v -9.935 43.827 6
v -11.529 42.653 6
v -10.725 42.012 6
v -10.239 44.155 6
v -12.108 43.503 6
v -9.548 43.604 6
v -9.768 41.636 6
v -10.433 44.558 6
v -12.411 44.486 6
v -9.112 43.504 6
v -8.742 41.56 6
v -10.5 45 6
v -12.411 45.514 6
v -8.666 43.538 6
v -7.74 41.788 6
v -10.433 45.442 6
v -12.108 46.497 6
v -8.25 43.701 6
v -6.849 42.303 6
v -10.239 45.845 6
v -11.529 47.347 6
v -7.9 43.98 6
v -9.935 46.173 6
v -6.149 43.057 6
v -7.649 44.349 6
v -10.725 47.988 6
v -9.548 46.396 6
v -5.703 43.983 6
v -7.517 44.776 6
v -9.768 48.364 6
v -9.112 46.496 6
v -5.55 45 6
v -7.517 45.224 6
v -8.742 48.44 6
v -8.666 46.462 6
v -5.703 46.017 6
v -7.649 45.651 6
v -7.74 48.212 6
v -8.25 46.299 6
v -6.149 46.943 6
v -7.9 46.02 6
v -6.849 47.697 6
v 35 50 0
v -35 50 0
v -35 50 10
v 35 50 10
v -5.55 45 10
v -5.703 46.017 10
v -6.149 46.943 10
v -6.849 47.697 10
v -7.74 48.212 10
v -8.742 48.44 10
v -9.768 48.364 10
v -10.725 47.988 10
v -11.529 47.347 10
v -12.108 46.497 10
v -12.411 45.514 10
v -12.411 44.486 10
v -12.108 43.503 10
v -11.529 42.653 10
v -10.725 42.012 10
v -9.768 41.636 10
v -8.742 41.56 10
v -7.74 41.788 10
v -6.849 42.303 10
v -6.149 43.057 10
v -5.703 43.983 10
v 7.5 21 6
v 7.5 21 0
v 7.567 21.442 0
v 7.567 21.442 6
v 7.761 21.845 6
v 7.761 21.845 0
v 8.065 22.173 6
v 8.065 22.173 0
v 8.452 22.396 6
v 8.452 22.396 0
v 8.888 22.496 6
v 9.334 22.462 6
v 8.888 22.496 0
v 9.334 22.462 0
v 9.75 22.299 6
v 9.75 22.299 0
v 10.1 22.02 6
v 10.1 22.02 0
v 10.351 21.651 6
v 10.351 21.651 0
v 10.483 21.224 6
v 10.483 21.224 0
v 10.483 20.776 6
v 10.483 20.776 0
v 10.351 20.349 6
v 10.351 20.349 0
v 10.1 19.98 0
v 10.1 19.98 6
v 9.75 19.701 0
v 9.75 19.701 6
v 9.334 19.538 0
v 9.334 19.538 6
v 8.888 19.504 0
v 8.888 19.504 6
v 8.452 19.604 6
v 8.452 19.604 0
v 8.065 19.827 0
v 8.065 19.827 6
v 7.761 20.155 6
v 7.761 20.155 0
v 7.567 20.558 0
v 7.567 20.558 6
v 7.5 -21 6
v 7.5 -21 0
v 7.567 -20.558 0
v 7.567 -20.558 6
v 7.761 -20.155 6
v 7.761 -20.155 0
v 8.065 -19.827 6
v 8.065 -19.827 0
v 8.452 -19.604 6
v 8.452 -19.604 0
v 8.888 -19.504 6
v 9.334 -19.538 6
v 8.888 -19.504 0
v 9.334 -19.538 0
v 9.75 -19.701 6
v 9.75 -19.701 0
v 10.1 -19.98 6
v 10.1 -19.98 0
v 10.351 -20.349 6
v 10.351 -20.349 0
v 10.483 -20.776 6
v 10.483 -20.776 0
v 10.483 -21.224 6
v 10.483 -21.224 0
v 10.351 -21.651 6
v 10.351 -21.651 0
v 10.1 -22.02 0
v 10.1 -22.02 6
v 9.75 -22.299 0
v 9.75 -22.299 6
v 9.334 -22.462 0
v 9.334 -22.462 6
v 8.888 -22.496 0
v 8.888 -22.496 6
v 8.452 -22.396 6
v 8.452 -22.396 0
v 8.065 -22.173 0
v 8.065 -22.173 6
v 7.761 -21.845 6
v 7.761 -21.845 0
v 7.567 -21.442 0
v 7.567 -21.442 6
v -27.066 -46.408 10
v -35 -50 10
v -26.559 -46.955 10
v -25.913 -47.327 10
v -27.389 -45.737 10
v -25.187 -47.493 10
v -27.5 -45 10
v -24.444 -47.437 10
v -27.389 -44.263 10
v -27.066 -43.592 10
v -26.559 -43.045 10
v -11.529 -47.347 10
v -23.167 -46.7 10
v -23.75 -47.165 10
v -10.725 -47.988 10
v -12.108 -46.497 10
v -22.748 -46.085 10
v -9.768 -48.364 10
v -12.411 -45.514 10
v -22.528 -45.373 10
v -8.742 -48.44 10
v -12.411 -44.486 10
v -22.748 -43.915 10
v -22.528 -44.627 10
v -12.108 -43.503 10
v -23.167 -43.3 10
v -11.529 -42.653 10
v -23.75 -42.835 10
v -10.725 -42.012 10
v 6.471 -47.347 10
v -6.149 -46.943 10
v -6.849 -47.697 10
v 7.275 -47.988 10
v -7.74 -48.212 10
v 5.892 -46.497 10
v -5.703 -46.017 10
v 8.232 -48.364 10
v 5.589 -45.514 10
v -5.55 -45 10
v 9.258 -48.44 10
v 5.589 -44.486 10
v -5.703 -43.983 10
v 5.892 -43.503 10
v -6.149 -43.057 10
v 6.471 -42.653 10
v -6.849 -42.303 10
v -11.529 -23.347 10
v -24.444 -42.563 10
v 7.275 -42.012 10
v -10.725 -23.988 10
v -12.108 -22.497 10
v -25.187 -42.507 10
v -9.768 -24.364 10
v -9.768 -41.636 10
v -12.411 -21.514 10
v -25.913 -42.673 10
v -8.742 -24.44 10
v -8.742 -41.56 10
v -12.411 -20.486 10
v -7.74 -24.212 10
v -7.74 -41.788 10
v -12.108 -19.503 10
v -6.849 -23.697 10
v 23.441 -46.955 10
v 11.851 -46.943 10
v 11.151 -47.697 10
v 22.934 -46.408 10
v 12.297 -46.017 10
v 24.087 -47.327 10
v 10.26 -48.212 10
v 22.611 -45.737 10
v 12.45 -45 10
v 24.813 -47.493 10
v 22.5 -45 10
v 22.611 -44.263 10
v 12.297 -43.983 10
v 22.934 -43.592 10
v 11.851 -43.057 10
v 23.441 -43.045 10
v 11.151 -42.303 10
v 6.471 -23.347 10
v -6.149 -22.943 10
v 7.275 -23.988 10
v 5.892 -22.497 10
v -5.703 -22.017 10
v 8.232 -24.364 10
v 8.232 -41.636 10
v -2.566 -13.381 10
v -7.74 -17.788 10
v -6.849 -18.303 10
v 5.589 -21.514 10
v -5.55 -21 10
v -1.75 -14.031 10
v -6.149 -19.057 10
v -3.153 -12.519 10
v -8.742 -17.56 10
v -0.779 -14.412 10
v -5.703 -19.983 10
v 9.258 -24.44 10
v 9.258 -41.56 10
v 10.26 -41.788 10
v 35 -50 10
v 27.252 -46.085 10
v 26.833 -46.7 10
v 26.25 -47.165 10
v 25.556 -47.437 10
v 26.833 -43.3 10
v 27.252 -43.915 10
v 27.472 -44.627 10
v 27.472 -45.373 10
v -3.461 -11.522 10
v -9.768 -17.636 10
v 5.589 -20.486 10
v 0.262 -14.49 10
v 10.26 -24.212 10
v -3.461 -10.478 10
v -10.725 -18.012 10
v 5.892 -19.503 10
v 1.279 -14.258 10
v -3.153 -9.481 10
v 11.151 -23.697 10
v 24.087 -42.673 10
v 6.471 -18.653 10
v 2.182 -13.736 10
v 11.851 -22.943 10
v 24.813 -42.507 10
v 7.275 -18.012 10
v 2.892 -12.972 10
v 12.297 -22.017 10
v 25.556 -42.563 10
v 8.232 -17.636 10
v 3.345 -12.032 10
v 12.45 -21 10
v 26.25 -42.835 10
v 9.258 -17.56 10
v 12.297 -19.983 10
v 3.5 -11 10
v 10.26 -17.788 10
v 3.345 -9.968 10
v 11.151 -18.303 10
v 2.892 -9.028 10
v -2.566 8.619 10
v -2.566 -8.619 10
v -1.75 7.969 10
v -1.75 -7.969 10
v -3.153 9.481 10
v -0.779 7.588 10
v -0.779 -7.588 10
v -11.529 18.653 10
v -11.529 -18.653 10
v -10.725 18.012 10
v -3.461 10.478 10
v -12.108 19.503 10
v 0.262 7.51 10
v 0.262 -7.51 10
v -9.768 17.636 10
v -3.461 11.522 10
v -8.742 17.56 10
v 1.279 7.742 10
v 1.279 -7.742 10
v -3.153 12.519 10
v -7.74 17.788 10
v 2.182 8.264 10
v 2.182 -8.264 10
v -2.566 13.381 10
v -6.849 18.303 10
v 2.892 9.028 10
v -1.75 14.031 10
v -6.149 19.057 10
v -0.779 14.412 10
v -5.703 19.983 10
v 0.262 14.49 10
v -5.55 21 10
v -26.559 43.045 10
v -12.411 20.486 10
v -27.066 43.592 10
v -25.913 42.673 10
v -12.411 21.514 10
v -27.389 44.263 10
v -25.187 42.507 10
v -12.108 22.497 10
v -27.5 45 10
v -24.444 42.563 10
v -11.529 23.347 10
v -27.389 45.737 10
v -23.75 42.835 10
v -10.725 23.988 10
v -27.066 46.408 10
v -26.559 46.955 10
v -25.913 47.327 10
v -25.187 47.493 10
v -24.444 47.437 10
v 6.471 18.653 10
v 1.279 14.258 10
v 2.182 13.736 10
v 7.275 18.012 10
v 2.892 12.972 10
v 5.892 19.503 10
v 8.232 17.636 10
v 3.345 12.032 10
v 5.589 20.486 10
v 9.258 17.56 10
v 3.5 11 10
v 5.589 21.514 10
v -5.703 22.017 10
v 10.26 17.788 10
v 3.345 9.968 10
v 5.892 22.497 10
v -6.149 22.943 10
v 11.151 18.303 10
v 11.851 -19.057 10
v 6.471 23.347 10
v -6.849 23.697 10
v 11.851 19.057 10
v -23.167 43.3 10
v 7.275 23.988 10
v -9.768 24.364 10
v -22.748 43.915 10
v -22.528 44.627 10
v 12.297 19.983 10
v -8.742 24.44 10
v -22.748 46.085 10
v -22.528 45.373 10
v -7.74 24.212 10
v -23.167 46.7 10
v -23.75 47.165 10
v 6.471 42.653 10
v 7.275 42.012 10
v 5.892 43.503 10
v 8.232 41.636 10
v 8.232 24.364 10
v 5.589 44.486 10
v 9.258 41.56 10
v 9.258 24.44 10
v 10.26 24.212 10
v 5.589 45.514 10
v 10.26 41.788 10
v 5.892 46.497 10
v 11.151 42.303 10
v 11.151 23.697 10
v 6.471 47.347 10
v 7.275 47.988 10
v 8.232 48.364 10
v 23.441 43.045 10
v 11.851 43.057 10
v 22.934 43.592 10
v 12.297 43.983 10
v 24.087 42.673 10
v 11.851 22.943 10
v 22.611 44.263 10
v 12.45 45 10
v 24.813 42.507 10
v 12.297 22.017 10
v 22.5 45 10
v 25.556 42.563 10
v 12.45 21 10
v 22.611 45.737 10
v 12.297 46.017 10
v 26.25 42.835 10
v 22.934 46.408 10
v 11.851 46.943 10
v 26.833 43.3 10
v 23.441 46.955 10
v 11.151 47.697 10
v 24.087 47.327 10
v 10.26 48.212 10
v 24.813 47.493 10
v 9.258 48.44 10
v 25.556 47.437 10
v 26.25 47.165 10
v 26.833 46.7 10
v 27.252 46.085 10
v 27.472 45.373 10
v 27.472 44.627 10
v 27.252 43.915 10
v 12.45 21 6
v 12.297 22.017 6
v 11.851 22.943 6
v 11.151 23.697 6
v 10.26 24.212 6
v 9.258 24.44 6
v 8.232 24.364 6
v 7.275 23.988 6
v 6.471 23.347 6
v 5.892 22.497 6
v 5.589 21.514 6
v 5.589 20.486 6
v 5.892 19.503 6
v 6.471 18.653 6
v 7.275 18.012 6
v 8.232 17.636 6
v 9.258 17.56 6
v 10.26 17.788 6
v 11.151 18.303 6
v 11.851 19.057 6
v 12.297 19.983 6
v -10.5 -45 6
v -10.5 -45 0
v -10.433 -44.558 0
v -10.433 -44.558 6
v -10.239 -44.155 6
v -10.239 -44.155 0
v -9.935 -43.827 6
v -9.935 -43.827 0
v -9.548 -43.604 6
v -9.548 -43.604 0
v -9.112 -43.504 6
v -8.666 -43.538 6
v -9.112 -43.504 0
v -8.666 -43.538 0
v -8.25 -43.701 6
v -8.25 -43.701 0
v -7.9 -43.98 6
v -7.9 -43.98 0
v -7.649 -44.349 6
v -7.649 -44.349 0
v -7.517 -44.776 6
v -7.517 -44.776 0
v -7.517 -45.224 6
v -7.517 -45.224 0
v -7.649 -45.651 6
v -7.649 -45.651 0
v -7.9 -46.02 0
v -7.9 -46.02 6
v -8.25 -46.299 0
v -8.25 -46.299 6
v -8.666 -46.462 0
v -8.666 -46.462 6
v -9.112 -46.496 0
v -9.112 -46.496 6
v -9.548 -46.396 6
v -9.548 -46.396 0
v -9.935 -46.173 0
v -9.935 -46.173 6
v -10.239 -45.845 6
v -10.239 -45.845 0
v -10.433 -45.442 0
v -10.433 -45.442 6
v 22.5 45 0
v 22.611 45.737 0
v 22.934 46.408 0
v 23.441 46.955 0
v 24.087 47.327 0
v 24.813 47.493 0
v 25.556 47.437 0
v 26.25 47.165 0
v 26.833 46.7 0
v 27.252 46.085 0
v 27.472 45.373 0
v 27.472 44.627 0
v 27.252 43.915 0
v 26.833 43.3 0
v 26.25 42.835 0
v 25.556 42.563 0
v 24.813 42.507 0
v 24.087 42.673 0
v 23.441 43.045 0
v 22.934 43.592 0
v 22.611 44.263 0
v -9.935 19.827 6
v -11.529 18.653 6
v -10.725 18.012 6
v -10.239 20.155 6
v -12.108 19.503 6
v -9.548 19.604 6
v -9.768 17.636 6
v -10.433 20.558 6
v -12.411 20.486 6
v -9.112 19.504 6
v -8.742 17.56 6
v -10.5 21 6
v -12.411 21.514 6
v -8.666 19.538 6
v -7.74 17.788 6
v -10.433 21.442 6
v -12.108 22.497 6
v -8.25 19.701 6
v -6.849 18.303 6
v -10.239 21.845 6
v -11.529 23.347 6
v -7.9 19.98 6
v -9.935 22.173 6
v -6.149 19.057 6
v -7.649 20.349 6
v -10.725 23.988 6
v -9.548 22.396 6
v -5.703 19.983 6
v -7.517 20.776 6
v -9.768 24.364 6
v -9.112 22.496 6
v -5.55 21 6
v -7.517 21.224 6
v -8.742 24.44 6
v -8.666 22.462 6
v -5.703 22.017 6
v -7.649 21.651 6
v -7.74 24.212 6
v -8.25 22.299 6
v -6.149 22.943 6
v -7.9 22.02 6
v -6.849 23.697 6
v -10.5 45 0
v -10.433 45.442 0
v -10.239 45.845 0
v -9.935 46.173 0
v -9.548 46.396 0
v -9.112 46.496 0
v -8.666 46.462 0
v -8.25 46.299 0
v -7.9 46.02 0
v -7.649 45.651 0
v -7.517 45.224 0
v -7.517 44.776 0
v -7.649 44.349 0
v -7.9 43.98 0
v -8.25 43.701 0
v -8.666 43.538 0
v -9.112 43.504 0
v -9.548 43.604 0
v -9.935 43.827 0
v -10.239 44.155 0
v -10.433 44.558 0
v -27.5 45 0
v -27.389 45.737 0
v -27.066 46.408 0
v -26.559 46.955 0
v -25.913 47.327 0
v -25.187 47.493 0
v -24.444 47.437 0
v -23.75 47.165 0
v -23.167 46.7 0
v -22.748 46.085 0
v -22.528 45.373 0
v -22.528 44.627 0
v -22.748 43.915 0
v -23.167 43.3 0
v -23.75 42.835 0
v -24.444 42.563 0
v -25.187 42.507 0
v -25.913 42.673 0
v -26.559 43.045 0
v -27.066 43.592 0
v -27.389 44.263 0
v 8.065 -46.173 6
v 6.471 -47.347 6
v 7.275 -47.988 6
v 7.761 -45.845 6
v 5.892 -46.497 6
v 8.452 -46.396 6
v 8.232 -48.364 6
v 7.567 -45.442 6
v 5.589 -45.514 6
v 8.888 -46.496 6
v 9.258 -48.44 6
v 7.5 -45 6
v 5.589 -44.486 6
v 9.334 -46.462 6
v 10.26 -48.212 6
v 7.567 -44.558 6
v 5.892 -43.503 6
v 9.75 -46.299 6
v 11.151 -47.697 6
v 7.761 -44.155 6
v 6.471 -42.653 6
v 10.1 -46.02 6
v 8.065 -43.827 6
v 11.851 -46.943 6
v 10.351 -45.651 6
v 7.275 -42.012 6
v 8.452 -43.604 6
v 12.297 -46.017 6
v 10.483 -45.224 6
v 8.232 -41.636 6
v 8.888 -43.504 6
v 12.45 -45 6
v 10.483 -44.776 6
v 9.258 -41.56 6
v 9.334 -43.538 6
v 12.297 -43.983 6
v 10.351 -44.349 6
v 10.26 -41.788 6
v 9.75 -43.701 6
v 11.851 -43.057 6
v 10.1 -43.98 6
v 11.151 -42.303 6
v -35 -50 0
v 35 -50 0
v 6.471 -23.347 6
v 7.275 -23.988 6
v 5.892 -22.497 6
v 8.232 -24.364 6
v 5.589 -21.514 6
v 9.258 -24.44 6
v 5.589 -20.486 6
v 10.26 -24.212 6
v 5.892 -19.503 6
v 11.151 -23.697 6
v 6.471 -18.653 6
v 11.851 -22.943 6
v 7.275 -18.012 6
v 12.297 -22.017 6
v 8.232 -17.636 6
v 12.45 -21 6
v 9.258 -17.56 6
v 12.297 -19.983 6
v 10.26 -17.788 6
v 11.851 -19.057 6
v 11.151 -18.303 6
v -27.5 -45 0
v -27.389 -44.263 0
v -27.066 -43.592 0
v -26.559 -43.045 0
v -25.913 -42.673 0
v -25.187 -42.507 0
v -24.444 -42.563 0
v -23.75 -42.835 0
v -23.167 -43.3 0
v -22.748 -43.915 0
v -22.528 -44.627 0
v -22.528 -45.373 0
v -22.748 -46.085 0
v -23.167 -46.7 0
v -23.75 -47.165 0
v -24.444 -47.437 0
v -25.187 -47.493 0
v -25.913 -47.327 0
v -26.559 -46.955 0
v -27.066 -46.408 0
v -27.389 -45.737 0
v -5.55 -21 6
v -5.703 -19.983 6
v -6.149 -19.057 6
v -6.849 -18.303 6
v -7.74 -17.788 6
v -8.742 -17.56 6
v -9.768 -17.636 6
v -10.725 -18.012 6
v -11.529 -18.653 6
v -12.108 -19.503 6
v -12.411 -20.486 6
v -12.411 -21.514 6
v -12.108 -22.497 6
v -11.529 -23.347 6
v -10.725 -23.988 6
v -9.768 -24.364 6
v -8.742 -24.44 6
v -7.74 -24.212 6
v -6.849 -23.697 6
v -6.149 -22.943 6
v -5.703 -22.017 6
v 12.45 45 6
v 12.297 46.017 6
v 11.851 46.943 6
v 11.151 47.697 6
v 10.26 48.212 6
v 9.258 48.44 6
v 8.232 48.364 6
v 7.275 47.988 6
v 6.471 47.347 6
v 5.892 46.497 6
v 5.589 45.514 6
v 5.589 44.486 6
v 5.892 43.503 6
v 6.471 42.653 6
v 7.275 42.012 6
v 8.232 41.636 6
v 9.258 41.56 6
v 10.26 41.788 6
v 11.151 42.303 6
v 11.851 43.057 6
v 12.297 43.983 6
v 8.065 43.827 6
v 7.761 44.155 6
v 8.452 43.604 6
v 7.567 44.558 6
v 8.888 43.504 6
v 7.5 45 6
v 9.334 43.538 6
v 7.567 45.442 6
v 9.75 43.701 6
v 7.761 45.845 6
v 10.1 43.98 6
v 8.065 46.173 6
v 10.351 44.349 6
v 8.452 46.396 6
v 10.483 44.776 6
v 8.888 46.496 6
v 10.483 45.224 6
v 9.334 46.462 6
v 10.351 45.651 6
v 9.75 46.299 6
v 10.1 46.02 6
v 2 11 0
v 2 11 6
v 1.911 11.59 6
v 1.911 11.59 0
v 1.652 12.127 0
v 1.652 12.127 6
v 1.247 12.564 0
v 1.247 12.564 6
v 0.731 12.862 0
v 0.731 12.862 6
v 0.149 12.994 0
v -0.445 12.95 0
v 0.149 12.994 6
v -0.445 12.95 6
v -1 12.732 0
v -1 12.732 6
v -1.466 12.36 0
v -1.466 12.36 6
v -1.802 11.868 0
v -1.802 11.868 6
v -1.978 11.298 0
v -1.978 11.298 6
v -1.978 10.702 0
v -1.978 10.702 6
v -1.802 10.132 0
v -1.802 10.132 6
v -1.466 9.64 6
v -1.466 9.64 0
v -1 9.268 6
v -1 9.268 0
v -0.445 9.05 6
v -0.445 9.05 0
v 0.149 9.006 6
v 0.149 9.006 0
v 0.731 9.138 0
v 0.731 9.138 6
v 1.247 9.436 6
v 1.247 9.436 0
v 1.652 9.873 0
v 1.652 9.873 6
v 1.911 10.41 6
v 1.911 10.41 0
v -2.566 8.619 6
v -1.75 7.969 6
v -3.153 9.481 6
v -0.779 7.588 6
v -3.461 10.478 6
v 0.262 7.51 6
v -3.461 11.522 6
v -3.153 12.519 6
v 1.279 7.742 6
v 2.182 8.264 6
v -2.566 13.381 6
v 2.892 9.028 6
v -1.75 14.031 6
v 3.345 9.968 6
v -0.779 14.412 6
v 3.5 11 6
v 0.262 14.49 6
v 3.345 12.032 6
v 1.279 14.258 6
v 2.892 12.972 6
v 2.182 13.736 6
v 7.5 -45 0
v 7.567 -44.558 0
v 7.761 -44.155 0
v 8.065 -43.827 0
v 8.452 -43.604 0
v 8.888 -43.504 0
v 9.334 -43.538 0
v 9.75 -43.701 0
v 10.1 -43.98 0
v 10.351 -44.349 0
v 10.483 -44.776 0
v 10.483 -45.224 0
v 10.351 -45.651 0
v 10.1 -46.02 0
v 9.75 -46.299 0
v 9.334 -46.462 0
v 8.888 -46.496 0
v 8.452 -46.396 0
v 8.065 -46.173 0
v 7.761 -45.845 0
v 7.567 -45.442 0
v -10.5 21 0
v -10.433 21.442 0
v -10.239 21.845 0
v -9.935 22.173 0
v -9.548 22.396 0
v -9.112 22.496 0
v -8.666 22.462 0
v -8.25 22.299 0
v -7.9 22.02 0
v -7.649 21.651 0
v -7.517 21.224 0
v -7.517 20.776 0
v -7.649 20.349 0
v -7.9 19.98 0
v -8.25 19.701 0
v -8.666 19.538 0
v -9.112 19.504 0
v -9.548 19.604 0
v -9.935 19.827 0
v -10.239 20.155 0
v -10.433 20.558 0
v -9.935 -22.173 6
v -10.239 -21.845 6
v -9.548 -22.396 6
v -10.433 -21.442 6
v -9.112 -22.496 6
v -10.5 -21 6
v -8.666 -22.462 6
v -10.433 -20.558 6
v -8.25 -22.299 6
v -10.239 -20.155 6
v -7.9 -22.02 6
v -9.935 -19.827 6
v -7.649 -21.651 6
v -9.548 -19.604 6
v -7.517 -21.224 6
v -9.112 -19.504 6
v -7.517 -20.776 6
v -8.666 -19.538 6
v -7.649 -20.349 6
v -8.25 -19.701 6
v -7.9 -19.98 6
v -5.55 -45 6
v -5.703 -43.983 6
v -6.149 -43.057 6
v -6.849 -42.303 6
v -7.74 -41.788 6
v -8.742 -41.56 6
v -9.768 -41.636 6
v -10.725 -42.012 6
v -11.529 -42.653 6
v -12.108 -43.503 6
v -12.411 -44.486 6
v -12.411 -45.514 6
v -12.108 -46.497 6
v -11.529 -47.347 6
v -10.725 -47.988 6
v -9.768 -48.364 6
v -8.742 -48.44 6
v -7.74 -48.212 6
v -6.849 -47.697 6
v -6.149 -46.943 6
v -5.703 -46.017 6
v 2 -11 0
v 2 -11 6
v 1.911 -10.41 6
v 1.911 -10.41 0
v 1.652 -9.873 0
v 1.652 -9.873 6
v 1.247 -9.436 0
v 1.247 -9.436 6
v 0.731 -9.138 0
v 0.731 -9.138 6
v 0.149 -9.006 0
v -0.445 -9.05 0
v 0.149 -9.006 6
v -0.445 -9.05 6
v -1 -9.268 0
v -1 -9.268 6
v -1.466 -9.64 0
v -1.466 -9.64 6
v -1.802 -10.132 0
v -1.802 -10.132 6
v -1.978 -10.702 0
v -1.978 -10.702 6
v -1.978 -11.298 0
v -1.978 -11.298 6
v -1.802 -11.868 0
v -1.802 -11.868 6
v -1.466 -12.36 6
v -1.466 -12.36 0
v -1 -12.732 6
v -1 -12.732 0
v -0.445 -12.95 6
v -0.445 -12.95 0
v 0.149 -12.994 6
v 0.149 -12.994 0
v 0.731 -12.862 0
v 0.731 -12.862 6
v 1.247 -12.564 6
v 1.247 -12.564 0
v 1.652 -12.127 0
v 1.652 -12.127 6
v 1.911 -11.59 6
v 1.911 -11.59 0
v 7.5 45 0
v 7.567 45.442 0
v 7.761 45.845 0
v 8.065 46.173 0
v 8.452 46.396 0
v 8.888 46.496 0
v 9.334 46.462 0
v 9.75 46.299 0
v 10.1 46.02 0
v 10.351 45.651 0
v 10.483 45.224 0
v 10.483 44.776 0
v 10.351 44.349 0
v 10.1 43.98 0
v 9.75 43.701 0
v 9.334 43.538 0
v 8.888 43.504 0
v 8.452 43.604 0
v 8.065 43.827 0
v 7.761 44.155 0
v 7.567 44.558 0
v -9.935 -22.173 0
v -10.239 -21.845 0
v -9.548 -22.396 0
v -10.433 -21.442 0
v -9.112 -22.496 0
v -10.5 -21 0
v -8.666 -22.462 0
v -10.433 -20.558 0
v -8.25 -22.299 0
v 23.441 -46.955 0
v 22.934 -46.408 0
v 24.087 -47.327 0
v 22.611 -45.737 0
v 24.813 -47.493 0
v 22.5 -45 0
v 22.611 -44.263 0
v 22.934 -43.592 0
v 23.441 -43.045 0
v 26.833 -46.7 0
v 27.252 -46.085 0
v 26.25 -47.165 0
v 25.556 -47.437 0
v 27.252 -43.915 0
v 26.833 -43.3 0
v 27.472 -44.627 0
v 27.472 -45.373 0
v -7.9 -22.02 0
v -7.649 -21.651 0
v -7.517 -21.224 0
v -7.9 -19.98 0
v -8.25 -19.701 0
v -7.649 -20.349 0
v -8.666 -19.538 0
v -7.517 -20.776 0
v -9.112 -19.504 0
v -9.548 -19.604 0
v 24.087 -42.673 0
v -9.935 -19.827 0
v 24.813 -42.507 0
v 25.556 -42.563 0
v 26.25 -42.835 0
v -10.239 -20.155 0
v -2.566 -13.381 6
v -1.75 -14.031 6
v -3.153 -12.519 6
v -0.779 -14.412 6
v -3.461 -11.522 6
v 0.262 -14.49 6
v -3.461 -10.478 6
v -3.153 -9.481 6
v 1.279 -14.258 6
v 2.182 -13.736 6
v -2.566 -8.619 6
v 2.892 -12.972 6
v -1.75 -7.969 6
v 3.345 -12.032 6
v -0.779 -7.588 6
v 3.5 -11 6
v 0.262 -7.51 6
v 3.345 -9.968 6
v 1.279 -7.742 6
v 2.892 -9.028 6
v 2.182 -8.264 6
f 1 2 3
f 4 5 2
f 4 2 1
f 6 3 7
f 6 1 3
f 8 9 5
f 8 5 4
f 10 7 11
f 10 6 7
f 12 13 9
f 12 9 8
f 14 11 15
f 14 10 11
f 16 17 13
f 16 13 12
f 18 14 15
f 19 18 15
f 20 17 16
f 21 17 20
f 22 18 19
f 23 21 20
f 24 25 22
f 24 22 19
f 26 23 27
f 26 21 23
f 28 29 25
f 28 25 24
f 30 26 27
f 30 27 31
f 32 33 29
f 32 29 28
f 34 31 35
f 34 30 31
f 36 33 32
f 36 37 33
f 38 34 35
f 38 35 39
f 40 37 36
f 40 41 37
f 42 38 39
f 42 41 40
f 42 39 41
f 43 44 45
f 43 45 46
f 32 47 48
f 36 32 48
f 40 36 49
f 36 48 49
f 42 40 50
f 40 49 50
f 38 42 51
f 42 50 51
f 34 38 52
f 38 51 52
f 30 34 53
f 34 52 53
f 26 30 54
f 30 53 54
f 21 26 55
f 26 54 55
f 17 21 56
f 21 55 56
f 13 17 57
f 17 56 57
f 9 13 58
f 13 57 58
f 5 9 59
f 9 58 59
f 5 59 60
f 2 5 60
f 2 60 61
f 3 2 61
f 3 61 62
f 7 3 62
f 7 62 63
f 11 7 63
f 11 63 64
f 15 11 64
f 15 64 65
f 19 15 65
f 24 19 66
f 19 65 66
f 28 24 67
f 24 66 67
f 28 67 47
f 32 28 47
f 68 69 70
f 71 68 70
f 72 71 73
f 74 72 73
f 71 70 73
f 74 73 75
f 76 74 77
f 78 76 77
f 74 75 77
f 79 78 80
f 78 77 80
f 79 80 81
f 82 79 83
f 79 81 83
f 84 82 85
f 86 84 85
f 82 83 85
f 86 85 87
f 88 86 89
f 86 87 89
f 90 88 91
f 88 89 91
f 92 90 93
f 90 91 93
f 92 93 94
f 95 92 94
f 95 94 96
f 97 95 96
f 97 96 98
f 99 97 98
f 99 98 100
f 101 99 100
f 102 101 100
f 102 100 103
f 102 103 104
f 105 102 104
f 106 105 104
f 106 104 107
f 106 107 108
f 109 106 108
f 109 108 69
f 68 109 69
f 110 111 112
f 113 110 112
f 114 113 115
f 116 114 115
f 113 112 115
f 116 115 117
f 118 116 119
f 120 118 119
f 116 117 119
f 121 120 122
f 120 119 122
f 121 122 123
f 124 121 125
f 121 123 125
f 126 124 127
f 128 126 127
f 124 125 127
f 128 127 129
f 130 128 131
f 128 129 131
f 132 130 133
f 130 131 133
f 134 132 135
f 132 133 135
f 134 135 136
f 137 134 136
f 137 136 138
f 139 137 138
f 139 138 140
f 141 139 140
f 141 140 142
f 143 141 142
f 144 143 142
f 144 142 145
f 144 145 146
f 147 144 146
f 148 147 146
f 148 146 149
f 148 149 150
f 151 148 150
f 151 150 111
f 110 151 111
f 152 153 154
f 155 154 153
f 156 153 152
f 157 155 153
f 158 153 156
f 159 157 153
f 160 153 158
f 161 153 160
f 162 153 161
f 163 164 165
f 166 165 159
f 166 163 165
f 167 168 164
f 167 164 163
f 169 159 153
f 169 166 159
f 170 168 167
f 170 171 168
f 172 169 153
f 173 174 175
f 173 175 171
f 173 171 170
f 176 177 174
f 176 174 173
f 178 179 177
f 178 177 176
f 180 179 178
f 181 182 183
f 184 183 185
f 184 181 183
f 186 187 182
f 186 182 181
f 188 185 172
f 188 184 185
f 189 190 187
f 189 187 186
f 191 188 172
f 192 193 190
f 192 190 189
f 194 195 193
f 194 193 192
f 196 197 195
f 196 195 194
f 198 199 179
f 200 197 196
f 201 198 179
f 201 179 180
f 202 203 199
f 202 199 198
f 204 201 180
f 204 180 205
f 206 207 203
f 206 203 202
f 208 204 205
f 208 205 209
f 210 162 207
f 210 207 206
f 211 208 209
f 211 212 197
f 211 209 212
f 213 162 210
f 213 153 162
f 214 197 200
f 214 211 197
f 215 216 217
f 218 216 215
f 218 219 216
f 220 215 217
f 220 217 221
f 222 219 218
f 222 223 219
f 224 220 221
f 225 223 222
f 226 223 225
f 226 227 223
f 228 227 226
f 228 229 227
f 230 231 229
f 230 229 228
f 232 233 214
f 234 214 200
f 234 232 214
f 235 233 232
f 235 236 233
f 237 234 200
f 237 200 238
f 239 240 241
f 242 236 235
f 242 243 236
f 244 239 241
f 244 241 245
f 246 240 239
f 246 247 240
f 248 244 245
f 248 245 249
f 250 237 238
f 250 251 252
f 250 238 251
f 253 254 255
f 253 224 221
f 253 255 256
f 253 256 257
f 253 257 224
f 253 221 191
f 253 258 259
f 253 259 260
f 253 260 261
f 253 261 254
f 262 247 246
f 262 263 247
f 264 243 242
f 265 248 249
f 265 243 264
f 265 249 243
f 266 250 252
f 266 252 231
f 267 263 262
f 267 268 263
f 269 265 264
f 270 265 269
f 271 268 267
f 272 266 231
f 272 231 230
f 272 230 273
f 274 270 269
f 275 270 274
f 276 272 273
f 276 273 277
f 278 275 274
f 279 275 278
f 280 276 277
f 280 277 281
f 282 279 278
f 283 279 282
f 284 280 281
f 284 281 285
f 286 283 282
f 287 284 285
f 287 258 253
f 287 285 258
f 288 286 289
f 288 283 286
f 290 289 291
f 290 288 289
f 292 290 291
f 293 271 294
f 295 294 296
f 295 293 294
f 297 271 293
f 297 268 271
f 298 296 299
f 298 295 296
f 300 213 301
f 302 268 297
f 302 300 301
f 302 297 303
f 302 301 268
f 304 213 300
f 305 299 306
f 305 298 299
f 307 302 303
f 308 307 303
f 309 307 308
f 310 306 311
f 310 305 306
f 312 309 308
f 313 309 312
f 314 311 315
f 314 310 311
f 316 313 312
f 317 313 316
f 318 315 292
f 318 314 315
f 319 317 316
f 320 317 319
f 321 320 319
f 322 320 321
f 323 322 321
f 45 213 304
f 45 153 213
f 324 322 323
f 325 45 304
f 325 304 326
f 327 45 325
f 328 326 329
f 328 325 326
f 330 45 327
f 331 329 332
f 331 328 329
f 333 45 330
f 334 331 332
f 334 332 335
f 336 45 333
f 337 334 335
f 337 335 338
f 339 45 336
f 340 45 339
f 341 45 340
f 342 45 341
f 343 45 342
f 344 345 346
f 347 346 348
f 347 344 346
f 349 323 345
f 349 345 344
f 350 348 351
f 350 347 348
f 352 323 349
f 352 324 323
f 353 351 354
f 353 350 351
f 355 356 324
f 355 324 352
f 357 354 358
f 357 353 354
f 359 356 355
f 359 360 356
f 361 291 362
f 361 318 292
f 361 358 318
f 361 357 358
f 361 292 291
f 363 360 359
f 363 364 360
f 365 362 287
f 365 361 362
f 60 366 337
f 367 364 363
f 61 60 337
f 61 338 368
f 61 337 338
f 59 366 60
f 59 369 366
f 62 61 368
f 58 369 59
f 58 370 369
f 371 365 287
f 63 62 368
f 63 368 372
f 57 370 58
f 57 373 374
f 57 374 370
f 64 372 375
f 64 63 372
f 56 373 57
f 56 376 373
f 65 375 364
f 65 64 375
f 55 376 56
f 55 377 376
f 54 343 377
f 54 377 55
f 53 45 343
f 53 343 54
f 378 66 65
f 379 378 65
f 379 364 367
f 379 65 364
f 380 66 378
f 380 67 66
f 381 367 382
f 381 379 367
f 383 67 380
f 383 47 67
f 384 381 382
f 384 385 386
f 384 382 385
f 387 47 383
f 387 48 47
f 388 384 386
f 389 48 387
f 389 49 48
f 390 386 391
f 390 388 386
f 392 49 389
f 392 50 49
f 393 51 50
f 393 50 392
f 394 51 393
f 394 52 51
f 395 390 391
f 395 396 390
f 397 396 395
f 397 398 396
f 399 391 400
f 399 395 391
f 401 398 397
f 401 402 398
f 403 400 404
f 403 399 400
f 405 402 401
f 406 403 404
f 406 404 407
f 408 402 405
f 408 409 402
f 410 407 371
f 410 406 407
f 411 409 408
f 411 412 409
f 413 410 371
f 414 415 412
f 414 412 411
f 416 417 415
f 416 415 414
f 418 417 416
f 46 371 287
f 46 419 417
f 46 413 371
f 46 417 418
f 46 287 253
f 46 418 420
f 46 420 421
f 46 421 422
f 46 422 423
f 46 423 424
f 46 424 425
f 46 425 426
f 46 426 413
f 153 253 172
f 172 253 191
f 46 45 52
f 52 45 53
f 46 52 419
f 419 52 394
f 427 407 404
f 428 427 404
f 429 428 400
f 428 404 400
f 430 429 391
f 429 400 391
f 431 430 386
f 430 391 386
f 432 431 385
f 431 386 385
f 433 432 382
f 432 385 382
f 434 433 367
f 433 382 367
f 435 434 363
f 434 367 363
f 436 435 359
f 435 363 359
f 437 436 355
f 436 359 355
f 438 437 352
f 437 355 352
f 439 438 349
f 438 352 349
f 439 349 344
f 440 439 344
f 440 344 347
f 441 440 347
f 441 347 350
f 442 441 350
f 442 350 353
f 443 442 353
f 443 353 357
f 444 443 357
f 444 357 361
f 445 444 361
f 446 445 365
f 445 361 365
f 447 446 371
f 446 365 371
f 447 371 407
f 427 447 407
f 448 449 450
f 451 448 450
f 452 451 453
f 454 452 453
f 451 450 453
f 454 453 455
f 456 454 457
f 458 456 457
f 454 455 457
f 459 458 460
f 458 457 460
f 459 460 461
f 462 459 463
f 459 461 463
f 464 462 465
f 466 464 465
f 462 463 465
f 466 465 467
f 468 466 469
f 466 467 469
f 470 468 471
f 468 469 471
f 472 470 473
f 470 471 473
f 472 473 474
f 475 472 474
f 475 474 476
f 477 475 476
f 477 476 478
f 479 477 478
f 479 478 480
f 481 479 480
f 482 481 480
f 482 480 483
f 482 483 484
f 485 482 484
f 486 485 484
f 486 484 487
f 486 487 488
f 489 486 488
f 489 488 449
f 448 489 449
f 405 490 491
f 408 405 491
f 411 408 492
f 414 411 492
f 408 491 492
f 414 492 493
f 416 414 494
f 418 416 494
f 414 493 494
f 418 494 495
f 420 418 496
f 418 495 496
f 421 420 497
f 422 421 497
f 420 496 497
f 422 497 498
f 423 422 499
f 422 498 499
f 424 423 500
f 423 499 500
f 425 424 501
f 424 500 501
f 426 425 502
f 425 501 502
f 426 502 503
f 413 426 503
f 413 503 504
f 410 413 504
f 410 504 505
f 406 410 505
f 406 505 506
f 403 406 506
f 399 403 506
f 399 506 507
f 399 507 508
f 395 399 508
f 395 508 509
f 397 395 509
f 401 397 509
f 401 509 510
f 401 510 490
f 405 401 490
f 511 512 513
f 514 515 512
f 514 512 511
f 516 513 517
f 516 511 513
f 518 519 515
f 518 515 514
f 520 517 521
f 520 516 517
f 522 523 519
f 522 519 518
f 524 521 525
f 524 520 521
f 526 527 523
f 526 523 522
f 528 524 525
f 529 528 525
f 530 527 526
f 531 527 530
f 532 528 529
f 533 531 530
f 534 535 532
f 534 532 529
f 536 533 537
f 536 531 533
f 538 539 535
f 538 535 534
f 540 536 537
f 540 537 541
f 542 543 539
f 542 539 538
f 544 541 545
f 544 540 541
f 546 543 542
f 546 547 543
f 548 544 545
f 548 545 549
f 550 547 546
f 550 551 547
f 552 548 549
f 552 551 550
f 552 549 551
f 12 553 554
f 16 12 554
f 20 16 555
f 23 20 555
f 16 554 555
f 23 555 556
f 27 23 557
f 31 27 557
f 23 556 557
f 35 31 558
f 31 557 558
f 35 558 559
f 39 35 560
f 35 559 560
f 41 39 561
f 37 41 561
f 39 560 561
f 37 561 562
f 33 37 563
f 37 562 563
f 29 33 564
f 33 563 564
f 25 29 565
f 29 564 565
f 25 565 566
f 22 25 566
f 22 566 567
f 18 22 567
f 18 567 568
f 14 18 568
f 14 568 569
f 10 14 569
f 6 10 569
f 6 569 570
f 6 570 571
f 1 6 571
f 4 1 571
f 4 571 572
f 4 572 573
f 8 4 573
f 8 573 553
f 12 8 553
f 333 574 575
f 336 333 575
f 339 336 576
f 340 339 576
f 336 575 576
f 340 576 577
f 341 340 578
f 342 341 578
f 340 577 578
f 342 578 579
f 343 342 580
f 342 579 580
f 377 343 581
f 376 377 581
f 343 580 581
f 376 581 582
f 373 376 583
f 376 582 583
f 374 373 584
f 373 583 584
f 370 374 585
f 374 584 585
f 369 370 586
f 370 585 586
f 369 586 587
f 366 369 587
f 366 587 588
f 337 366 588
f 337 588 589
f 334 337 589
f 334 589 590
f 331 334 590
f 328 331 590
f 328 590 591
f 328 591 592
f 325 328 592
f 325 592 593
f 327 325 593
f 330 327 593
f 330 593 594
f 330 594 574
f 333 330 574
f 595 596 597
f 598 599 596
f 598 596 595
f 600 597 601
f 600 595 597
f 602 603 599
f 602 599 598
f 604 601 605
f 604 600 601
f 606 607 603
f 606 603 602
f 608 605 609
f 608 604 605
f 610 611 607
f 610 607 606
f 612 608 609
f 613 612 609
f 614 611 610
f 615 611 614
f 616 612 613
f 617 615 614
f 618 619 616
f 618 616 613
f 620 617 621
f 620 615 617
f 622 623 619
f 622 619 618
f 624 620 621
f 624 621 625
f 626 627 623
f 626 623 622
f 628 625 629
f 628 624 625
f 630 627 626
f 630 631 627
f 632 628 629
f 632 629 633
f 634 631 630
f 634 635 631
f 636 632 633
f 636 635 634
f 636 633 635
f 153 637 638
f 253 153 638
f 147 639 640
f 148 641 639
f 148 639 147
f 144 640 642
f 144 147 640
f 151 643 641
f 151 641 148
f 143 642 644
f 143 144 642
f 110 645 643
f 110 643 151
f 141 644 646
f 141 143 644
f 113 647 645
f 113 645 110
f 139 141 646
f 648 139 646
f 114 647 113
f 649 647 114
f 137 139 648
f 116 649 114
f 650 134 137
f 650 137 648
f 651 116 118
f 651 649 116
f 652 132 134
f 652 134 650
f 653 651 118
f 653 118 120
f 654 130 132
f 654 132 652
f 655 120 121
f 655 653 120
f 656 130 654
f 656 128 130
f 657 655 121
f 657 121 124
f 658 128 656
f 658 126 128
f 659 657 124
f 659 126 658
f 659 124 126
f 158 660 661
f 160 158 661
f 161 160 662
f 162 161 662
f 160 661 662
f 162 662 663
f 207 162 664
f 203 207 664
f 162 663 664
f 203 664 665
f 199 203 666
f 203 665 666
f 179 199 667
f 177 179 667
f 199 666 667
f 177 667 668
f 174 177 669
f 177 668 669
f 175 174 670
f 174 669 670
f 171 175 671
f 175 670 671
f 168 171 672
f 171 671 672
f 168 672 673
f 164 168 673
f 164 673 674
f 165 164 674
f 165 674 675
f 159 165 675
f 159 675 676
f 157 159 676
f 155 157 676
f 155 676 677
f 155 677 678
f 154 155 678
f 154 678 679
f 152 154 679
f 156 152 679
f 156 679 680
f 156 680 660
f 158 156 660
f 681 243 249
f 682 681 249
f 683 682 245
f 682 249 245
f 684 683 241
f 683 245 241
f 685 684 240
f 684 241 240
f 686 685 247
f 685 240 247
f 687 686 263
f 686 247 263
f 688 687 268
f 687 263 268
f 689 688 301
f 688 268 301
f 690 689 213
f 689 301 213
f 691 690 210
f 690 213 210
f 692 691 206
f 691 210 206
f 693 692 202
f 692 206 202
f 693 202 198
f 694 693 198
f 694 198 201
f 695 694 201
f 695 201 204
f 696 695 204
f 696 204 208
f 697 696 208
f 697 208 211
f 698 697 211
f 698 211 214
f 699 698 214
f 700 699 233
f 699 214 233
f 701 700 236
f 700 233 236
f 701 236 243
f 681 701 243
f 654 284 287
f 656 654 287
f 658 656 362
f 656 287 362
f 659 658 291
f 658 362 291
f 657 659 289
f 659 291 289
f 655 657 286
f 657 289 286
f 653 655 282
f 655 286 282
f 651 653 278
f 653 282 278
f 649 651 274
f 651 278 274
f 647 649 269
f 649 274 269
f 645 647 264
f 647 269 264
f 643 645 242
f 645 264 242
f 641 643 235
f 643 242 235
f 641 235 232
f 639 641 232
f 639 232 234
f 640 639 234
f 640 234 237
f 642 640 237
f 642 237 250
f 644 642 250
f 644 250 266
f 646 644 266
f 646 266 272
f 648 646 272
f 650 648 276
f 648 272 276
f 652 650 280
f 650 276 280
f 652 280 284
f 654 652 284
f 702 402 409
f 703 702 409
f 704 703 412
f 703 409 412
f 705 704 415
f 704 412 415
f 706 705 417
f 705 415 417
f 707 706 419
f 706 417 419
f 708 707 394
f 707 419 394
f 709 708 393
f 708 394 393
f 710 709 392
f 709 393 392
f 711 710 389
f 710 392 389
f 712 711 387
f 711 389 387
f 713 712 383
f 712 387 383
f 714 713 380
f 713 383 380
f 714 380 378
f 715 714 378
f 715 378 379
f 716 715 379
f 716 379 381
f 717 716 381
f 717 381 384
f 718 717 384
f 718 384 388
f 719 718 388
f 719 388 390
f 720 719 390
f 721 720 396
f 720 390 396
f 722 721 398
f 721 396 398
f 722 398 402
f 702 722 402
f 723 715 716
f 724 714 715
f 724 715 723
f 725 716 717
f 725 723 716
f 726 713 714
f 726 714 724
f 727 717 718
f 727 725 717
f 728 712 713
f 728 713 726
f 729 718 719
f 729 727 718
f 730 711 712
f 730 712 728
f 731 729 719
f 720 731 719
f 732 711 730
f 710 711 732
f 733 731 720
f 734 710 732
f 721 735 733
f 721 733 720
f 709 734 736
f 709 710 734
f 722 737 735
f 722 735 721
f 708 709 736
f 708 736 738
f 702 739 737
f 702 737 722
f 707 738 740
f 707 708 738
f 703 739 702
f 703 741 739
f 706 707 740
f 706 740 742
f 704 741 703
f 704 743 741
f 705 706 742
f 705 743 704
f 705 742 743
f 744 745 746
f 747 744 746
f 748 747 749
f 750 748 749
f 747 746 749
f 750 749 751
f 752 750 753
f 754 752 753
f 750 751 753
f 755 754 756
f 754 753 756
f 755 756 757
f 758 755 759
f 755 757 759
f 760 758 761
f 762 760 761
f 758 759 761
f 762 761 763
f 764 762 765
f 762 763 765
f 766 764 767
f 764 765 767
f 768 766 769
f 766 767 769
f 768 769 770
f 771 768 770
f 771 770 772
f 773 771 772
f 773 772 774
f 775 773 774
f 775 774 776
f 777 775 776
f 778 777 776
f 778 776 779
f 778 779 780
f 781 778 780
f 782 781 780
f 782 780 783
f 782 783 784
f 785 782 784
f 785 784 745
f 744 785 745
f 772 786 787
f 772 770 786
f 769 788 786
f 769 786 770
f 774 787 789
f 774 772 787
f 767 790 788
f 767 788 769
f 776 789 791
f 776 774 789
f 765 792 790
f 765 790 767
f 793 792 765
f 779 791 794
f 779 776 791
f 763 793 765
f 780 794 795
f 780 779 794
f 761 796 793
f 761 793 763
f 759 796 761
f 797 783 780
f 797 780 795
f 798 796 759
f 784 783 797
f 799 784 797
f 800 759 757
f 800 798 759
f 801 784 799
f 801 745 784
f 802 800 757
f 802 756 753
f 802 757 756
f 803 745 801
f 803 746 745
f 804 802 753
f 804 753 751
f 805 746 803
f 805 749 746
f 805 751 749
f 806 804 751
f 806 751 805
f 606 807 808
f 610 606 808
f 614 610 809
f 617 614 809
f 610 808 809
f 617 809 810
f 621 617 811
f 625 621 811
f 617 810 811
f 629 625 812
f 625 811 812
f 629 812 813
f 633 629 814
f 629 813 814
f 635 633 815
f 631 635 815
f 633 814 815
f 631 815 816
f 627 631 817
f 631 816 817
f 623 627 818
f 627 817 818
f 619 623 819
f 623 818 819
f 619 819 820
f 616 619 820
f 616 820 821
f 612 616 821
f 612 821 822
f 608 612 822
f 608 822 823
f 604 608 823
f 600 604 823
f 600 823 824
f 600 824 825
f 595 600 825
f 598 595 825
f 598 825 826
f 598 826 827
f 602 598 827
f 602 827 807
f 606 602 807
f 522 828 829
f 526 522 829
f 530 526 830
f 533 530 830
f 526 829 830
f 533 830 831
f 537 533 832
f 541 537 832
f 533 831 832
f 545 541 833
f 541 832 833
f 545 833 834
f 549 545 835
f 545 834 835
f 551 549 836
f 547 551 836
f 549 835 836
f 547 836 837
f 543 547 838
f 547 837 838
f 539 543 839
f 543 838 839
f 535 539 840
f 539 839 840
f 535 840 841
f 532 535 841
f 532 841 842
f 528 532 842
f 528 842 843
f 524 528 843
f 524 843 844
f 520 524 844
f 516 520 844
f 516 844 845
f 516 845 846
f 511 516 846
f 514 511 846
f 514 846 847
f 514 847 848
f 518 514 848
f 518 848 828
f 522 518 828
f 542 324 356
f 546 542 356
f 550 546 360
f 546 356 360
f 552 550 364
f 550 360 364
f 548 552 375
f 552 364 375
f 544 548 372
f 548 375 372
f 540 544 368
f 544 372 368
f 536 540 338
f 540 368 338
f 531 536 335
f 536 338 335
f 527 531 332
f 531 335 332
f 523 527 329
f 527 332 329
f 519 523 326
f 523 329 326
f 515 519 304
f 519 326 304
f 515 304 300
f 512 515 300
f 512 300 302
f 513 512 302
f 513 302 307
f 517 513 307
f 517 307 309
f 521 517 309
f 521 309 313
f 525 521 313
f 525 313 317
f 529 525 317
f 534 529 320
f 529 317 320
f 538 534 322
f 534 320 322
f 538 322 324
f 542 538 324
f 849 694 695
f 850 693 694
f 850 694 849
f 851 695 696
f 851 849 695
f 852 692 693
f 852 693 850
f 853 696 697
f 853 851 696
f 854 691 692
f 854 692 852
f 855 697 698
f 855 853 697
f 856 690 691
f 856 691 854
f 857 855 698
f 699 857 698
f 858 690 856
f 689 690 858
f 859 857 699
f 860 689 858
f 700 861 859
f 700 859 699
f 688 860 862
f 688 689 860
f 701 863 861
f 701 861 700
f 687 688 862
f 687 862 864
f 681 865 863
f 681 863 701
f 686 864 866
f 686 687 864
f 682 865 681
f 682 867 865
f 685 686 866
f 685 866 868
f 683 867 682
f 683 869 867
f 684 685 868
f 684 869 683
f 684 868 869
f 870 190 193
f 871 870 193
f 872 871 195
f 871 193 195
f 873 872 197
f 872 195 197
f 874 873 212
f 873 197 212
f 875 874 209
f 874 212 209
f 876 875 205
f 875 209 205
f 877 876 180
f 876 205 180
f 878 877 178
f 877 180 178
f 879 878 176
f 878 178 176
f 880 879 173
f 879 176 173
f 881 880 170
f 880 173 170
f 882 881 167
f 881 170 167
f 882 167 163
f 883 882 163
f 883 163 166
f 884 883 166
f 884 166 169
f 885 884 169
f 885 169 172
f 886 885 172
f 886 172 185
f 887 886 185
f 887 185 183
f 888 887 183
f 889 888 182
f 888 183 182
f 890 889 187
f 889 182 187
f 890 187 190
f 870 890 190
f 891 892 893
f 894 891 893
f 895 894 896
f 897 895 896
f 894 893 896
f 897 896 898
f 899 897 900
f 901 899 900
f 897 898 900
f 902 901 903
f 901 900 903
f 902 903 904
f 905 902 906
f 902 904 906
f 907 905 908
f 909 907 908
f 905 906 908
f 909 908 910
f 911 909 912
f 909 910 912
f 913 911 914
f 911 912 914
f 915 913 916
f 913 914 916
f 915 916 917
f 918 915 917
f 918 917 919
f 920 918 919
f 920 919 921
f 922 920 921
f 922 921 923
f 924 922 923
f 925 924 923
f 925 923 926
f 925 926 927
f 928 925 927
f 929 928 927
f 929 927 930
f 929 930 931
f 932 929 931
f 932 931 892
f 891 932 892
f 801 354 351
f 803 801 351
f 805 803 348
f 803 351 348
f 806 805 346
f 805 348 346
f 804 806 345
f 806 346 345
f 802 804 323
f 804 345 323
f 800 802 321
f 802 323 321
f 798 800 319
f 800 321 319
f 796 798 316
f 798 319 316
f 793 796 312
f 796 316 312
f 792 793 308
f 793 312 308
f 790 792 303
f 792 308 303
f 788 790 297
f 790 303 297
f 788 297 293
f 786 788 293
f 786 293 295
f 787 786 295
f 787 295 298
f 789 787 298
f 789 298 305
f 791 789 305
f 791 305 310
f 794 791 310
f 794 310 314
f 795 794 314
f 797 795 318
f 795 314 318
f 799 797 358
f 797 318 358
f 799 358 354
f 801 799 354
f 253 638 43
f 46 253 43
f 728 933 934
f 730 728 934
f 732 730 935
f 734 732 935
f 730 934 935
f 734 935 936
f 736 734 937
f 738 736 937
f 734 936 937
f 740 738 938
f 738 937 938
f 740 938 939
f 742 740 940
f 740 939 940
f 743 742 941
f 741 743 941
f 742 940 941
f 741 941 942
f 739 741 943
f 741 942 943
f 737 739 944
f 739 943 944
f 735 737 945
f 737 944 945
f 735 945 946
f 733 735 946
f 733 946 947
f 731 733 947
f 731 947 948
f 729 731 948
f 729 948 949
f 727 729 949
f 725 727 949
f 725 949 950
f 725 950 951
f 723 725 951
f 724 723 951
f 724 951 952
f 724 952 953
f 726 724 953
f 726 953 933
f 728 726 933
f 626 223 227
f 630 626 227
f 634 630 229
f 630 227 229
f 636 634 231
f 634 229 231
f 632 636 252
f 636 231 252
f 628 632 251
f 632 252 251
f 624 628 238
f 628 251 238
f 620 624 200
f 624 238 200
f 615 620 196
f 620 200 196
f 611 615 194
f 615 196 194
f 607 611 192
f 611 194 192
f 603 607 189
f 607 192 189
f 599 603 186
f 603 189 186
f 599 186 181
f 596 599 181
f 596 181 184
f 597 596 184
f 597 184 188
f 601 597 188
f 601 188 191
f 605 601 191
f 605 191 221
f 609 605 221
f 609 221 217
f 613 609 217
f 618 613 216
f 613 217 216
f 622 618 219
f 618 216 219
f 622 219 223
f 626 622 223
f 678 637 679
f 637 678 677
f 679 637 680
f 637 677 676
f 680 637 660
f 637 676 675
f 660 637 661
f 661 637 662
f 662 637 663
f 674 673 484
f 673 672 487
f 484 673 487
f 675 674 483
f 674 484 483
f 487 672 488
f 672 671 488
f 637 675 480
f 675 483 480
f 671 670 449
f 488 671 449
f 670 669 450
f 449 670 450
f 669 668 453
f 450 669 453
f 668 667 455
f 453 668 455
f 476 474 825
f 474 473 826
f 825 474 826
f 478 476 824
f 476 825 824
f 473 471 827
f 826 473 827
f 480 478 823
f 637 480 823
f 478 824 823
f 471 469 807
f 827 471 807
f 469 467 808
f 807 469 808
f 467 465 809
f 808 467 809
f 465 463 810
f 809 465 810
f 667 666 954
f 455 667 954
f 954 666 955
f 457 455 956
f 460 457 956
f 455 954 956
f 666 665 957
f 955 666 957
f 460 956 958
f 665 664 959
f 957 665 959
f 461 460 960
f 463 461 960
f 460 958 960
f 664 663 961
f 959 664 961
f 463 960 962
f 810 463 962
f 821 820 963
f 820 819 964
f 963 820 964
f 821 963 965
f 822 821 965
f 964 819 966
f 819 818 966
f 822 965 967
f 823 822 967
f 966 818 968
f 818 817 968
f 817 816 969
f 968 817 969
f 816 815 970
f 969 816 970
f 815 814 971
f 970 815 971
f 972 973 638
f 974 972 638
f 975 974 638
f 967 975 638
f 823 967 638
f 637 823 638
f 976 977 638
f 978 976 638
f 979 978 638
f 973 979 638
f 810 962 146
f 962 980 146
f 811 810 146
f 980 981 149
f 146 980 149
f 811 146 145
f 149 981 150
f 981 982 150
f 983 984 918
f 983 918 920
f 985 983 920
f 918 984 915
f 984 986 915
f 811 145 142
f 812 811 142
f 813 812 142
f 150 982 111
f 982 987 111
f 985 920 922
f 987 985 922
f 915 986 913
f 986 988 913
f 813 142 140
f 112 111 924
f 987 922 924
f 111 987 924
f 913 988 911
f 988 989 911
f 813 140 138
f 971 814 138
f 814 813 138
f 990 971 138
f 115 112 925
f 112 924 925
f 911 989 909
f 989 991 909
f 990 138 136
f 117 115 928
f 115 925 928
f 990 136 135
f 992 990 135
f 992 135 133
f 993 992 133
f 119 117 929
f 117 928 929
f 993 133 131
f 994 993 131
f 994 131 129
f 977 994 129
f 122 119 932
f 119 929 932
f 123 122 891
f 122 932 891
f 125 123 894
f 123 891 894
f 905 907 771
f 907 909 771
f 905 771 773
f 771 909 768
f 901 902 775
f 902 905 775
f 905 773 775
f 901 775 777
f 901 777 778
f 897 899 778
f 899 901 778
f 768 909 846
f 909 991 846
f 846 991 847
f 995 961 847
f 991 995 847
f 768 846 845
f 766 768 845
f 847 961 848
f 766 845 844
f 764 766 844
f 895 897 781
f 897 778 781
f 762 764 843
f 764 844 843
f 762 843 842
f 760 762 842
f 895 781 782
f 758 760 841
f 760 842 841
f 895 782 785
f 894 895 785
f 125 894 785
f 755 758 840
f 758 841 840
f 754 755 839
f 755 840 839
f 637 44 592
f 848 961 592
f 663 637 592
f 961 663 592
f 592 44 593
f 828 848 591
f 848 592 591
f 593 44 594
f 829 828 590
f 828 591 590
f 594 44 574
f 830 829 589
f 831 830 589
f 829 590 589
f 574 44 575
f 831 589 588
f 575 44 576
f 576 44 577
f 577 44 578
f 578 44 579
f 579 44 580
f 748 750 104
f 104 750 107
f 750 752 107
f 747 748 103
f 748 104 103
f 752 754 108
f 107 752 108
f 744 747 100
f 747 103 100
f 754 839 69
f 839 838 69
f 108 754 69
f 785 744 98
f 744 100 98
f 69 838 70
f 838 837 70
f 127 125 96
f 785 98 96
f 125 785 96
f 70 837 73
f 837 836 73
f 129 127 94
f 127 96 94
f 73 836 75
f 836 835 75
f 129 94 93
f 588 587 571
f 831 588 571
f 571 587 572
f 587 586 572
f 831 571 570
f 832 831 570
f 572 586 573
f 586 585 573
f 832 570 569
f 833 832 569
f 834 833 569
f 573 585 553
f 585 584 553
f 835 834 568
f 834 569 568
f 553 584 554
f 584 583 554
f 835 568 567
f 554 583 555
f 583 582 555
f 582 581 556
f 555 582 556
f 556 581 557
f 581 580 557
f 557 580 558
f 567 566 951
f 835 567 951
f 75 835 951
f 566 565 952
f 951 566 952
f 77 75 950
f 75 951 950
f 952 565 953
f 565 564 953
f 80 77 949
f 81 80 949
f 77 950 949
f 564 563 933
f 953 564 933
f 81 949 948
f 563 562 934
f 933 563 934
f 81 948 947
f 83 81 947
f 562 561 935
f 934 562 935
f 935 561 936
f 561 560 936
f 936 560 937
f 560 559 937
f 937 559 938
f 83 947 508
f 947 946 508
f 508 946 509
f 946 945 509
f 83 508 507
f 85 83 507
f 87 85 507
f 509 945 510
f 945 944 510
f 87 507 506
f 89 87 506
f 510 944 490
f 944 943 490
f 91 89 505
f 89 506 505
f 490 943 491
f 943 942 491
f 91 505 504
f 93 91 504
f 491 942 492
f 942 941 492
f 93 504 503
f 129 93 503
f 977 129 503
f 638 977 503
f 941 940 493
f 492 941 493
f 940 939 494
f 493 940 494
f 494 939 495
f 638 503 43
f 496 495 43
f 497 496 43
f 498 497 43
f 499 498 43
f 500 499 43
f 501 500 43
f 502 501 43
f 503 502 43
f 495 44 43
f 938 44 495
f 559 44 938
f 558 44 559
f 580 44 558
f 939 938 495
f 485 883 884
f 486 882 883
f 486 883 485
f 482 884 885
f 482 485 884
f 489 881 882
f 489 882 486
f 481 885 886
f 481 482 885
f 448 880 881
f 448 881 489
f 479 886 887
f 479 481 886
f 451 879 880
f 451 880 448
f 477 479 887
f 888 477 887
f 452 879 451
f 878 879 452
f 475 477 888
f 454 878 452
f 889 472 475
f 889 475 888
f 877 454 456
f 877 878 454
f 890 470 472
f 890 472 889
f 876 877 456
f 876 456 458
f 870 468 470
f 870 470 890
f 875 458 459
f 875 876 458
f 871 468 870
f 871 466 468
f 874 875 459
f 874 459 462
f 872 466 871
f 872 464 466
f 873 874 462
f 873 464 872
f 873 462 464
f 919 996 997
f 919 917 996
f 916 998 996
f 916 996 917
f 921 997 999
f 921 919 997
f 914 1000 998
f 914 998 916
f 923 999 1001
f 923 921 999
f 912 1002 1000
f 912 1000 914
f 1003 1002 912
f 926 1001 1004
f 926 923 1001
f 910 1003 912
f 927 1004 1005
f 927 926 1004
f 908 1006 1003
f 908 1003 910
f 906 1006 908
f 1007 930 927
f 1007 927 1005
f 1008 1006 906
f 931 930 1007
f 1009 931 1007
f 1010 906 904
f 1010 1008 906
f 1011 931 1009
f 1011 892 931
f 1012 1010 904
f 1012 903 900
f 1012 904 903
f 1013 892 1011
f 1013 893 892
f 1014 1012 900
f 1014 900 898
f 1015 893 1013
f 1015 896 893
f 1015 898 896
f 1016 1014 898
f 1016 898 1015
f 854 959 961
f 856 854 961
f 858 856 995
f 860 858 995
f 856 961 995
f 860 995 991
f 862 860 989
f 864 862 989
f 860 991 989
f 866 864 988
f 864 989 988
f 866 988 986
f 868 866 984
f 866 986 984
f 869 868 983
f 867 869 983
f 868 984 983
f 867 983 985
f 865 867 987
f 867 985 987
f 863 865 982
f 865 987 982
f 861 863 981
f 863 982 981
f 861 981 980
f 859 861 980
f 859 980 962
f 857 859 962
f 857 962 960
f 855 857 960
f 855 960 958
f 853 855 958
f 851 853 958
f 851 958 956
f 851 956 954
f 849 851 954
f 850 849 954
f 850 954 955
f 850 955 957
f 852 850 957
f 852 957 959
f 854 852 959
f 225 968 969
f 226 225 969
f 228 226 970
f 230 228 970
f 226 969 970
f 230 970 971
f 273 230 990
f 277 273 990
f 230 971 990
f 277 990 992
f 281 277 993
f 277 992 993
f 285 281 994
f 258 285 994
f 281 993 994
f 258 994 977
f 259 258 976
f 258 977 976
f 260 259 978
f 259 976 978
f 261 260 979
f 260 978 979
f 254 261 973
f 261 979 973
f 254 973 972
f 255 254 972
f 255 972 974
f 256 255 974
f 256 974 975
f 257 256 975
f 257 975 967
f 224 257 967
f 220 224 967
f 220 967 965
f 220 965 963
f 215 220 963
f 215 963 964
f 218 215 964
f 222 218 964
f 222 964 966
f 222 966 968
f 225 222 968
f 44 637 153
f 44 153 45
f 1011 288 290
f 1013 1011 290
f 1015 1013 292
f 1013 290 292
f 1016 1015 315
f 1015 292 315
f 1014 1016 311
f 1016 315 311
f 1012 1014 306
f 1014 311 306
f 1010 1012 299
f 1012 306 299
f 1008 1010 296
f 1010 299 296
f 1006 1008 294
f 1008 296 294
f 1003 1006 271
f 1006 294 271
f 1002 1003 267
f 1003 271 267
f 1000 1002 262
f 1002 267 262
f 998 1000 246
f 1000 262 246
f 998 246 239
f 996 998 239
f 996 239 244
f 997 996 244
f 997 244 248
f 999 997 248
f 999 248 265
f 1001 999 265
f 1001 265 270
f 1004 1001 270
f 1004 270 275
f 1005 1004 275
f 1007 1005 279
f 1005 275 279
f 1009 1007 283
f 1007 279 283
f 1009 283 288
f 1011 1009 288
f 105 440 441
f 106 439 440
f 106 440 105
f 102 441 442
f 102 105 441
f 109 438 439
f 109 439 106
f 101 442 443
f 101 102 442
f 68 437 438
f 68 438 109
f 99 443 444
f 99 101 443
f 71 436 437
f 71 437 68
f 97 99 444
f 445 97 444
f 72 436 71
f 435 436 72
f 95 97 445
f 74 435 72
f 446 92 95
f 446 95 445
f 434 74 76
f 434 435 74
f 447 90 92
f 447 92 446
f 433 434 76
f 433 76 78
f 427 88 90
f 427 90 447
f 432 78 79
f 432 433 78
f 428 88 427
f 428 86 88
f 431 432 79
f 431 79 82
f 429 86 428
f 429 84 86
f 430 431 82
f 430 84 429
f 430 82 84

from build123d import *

# Parameters (mm, degrees)
SKETCH1_W           = 70
SKETCH1_H           = 100
BOSS_EXTRUDE1_DEPTH = 10
SKETCH2_R           = 2.5
CUT_EXTRUDE1_DEPTH  = 11
SKETCH3_R           = 1.5
CUT_EXTRUDE2_DEPTH  = 11
SKETCH4_R           = 3.45
CUT_EXTRUDE3_DEPTH  = 4
SKETCH5_R           = 2
CUT_EXTRUDE4_DEPTH  = 11
SKETCH6_R           = 3.5
CUT_EXTRUDE5_DEPTH  = 4


with BuildPart() as part:
    # Sketch1 → Boss-Extrude1 (new body)
    with BuildSketch(Plane.XY):
        Rectangle(SKETCH1_W, SKETCH1_H)
    extrude(amount=BOSS_EXTRUDE1_DEPTH)

    # Sketch2 → Cut-Extrude1 (cut, through all)
    with BuildSketch(Plane(origin=(0, 0, 0), x_dir=(-1, 0, 0), z_dir=(0, 0, -1))):
        with Locations((-25, 45)):
            Circle(SKETCH2_R)
        with Locations((25, 45)):
            Circle(SKETCH2_R)
        with Locations((-25, -45)):
            Circle(SKETCH2_R)
        with Locations((25, -45)):
            Circle(SKETCH2_R)
    extrude(amount=-CUT_EXTRUDE1_DEPTH, mode=Mode.SUBTRACT)

    # Sketch3 → Cut-Extrude2 (cut, through all)
    with BuildSketch(Plane(origin=(0, 0, 0), x_dir=(-1, 0, 0), z_dir=(0, 0, -1))):
        with Locations((9, 21)):
            Circle(SKETCH3_R)
        with Locations((9, 45)):
            Circle(SKETCH3_R)
        with Locations((-9, 21)):
            Circle(SKETCH3_R)
        with Locations((-9, 45)):
            Circle(SKETCH3_R)
        with Locations((9, -45)):
            Circle(SKETCH3_R)
        with Locations((9, -21)):
            Circle(SKETCH3_R)
        with Locations((-9, -45)):
            Circle(SKETCH3_R)
        with Locations((-9, -21)):
            Circle(SKETCH3_R)
    extrude(amount=-CUT_EXTRUDE2_DEPTH, mode=Mode.SUBTRACT)

    # Sketch4 → Cut-Extrude3 (cut)
    with BuildSketch(Plane.XY.offset(10)):
        with Locations((-9, 45)):
            Circle(SKETCH4_R)
        with Locations((-9, 21)):
            Circle(SKETCH4_R)
        with Locations((9, 21)):
            Circle(SKETCH4_R)
        with Locations((9, 45)):
            Circle(SKETCH4_R)
        with Locations((9, -21)):
            Circle(SKETCH4_R)
        with Locations((-9, -21)):
            Circle(SKETCH4_R)
        with Locations((-9, -45)):
            Circle(SKETCH4_R)
        with Locations((9, -45)):
            Circle(SKETCH4_R)
    extrude(amount=-CUT_EXTRUDE3_DEPTH, mode=Mode.SUBTRACT)

    # Sketch5 → Cut-Extrude4 (cut, through all)
    with BuildSketch(Plane.XY.offset(10)):
        with Locations((0, -11)):
            Circle(SKETCH5_R)
        with Locations((0, 11)):
            Circle(SKETCH5_R)
    extrude(amount=-CUT_EXTRUDE4_DEPTH, mode=Mode.SUBTRACT)

    # Sketch6 → Cut-Extrude5 (cut)
    with BuildSketch(Plane.XY.offset(10)):
        with Locations((0, 11)):
            Circle(SKETCH6_R)
        with Locations((0, -11)):
            Circle(SKETCH6_R)
    extrude(amount=-CUT_EXTRUDE5_DEPTH, mode=Mode.SUBTRACT)


solid = part.part
